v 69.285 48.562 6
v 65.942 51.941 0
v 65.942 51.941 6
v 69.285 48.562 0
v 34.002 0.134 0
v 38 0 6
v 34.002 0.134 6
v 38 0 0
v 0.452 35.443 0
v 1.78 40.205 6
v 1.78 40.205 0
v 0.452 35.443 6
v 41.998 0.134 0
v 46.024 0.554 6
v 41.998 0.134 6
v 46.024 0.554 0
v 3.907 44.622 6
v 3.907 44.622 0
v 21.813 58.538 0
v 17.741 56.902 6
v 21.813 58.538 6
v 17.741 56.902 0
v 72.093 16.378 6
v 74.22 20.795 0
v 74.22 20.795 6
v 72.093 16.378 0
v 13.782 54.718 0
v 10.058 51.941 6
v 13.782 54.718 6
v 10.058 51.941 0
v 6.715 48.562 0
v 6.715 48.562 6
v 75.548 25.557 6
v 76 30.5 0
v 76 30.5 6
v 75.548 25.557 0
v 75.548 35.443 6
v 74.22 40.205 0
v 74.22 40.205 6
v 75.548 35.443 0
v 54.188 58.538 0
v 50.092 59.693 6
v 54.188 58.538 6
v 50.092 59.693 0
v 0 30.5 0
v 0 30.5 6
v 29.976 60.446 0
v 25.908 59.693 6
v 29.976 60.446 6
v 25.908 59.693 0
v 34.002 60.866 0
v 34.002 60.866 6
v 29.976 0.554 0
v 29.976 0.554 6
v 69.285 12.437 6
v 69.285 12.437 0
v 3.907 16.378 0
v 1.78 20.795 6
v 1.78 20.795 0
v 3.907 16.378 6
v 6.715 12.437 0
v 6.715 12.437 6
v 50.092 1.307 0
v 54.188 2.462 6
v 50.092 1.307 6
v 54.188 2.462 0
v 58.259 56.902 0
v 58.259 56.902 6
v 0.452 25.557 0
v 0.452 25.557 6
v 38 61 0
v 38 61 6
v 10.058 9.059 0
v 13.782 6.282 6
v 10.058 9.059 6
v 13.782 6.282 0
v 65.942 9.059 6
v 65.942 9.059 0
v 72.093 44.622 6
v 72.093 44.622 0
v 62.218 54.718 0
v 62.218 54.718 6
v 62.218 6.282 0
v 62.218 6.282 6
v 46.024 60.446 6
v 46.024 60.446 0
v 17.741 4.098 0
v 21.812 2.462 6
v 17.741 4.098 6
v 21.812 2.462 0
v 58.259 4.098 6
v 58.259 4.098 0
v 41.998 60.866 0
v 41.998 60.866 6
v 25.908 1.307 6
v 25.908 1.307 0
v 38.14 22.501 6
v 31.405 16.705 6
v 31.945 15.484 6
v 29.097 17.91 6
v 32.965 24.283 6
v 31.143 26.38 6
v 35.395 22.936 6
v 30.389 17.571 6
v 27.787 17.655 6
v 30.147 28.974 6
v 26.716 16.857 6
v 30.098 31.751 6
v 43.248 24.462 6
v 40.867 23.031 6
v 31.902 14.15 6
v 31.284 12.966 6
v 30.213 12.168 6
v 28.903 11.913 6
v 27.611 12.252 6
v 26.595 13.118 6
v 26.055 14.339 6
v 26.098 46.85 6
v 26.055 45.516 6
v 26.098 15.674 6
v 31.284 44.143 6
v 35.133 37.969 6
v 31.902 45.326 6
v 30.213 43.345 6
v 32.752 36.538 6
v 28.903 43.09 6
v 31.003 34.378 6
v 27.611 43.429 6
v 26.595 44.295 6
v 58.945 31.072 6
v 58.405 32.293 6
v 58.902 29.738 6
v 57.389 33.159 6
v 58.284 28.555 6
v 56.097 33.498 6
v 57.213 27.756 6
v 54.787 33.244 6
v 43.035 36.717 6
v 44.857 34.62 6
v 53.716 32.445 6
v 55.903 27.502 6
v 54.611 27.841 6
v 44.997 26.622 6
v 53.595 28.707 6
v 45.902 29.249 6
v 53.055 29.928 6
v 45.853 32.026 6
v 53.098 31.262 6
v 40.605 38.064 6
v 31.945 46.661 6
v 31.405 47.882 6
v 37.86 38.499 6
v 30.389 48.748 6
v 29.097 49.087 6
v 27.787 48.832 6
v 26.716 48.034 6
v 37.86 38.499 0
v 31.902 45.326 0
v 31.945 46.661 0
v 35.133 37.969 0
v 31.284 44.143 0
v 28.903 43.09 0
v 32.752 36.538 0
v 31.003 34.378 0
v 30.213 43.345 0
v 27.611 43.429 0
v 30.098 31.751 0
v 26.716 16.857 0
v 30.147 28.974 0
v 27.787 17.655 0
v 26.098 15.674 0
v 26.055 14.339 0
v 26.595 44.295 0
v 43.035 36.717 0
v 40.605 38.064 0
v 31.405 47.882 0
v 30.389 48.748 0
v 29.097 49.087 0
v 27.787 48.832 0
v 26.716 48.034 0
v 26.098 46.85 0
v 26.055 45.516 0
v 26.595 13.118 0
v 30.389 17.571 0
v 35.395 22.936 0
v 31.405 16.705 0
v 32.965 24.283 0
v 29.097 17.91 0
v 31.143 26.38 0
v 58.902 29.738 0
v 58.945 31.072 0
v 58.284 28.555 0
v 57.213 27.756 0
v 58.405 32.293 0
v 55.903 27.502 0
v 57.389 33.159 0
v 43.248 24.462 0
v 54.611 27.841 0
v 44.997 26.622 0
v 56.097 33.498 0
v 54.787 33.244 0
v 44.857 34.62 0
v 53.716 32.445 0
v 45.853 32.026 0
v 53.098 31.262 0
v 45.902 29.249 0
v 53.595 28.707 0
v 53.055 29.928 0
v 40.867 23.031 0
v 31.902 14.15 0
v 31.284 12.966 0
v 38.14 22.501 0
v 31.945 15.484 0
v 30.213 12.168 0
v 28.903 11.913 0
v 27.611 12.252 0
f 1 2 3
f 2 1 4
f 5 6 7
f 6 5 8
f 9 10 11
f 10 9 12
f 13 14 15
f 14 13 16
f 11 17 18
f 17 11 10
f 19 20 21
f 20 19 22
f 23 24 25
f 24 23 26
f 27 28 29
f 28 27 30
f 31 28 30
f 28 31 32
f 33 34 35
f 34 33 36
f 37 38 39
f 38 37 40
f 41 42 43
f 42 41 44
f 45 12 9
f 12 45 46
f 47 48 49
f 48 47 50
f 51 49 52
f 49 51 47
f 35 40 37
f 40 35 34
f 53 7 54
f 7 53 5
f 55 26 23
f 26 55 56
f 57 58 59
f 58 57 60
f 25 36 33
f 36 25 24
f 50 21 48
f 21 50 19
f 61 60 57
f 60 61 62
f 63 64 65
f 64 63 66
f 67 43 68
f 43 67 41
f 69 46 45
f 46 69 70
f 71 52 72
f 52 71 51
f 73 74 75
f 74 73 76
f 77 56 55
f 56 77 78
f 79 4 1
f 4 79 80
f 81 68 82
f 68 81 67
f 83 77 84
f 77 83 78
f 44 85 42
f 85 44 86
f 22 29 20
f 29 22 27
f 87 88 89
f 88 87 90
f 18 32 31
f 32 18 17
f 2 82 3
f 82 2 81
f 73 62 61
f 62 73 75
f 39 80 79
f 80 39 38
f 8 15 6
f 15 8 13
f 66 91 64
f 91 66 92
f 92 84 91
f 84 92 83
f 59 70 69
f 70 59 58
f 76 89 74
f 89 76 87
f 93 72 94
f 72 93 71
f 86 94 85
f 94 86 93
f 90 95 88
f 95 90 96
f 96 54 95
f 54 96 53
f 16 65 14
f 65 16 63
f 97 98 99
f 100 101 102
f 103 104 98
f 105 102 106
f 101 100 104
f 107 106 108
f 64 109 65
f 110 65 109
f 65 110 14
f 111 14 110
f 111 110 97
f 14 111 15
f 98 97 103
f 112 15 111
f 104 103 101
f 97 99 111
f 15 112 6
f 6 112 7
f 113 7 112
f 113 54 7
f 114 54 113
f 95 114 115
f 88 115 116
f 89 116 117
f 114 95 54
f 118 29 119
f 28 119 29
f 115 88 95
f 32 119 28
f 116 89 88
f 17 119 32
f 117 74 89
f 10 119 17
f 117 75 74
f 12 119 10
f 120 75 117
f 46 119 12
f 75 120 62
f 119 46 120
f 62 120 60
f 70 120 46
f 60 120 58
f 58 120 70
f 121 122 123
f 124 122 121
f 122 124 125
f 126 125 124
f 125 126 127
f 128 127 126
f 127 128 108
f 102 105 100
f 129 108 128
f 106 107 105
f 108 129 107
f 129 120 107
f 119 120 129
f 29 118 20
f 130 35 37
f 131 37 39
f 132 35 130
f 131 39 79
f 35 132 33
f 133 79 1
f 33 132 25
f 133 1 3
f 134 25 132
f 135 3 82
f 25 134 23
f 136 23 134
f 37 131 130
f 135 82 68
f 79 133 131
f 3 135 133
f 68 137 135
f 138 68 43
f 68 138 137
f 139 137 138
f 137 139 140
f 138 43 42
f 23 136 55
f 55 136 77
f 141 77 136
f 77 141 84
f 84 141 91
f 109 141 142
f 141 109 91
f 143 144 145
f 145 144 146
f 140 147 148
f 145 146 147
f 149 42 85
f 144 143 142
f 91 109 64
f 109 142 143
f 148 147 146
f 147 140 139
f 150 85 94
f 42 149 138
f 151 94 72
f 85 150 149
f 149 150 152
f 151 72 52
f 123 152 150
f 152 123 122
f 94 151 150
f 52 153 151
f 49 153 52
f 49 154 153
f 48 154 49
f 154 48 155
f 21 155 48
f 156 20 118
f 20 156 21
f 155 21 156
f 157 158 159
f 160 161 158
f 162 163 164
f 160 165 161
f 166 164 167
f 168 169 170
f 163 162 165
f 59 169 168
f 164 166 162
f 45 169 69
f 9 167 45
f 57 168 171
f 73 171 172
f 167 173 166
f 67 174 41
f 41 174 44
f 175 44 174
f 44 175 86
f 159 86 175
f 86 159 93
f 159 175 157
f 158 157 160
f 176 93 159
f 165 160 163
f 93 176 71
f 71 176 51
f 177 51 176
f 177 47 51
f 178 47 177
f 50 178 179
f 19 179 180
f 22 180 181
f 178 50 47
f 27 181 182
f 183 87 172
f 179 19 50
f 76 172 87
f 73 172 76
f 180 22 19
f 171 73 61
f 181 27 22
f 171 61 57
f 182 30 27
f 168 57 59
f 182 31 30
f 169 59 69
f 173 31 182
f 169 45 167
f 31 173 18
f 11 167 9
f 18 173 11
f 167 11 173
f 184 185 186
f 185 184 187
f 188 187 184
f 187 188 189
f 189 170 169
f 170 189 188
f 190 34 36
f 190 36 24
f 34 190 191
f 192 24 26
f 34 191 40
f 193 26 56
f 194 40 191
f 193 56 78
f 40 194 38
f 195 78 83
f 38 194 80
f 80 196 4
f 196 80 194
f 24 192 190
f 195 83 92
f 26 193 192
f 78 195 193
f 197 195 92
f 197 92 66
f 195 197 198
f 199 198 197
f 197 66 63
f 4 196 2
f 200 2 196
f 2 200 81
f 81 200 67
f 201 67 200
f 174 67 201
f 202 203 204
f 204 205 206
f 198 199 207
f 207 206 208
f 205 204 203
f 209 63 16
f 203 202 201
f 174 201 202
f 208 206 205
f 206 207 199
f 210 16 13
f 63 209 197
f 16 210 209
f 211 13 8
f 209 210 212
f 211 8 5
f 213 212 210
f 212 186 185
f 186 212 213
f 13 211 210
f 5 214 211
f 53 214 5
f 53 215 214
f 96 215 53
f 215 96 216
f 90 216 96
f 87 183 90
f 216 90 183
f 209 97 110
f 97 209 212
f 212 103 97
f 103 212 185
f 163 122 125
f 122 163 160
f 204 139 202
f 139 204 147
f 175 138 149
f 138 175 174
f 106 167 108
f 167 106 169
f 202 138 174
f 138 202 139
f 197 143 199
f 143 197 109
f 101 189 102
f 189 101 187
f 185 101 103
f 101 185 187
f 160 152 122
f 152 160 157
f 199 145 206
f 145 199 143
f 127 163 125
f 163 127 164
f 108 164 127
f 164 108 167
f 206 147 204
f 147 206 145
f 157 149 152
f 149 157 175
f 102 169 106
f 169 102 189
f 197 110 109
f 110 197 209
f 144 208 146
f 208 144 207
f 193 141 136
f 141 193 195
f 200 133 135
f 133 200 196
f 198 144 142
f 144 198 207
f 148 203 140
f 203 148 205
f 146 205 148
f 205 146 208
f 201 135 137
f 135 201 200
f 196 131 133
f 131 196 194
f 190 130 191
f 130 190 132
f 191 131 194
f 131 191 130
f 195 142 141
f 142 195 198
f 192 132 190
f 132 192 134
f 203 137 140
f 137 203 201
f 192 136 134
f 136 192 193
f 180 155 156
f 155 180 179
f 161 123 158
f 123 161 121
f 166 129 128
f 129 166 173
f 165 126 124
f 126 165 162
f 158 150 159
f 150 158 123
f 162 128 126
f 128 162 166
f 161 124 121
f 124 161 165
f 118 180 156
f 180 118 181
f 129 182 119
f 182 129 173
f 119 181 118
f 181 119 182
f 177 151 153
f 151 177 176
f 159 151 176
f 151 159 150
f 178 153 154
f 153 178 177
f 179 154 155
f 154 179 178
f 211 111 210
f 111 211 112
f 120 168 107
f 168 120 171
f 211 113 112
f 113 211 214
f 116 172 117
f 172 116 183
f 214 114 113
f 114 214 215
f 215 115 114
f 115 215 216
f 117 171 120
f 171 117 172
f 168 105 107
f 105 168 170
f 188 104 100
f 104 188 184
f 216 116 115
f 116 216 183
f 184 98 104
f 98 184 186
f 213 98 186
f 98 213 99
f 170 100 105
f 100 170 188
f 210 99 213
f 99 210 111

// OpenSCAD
$fn = 32;

// ----------------------------------------------------------------------
// Cam plate: double_lobe cam, base R28
// ----------------------------------------------------------------------

// --- parameters (mm) ---
base_r = 28;              // base circle radius
lobe_h = 10;              // cam lobe rise
bore_r = 8;               // shaft bore radius
plate_t = 6;              // plate thickness, Z (extrusion height)
ring_r = 18;              // lightening ring radius
bolt_r = 3;               // lightening hole radius

profile = [[76, 30.5], [75.548, 35.443], [74.22, 40.205], [72.093, 44.622], [69.285, 48.562], [65.942, 51.941], [62.218, 54.718], [58.259, 56.902], [54.188, 58.538], [50.092, 59.693], [46.024, 60.446], [41.998, 60.866], [38, 61], [34.002, 60.866], [29.976, 60.446], [25.908, 59.693], [21.813, 58.538], [17.741, 56.902], [13.782, 54.718], [10.058, 51.941], [6.715, 48.562], [3.907, 44.622], [1.78, 40.205], [0.452, 35.443], [0, 30.5], [0.452, 25.557], [1.78, 20.795], [3.907, 16.378], [6.715, 12.437], [10.058, 9.059], [13.782, 6.282], [17.741, 4.098], [21.812, 2.462], [25.908, 1.307], [29.976, 0.554], [34.002, 0.134], [38, 0], [41.998, 0.134], [46.024, 0.554], [50.092, 1.307], [54.188, 2.462], [58.259, 4.098], [62.218, 6.282], [65.942, 9.059], [69.285, 12.437], [72.093, 16.378], [74.22, 20.795], [75.548, 25.557]];  // primary outline, 48 points, counter clockwise
void_1 = [[45.853, 32.026], [44.857, 34.62], [43.035, 36.717], [40.605, 38.064], [37.86, 38.499], [35.133, 37.969], [32.752, 36.538], [31.003, 34.378], [30.098, 31.751], [30.147, 28.974], [31.143, 26.38], [32.965, 24.283], [35.395, 22.936], [38.14, 22.501], [40.867, 23.031], [43.248, 24.462], [44.997, 26.622], [45.902, 29.249]];  // shaft bore, 18 points
void_2 = [[58.945, 31.072], [58.405, 32.293], [57.389, 33.159], [56.097, 33.498], [54.787, 33.244], [53.716, 32.445], [53.098, 31.262], [53.055, 29.928], [53.595, 28.707], [54.611, 27.841], [55.903, 27.502], [57.213, 27.756], [58.284, 28.555], [58.902, 29.738]];  // lightening hole 1, 14 points
void_3 = [[31.945, 46.661], [31.405, 47.882], [30.389, 48.748], [29.097, 49.087], [27.787, 48.832], [26.716, 48.034], [26.098, 46.85], [26.055, 45.516], [26.595, 44.295], [27.611, 43.429], [28.903, 43.09], [30.213, 43.345], [31.284, 44.143], [31.902, 45.326]];  // lightening hole 2, 14 points
void_4 = [[31.945, 15.484], [31.405, 16.705], [30.389, 17.571], [29.097, 17.91], [27.787, 17.655], [26.716, 16.857], [26.098, 15.674], [26.055, 14.339], [26.595, 13.118], [27.611, 12.252], [28.903, 11.913], [30.213, 12.168], [31.284, 12.966], [31.902, 14.15]];  // lightening hole 3, 14 points

// --- the one profile operation ---
difference() {
  linear_extrude(height = plate_t) polygon(points = profile);
  translate([0, 0, -1])
    linear_extrude(height = plate_t + 2) polygon(points = void_1);
  translate([0, 0, -1])
    linear_extrude(height = plate_t + 2) polygon(points = void_2);
  translate([0, 0, -1])
    linear_extrude(height = plate_t + 2) polygon(points = void_3);
  translate([0, 0, -1])
    linear_extrude(height = plate_t + 2) polygon(points = void_4);
}
